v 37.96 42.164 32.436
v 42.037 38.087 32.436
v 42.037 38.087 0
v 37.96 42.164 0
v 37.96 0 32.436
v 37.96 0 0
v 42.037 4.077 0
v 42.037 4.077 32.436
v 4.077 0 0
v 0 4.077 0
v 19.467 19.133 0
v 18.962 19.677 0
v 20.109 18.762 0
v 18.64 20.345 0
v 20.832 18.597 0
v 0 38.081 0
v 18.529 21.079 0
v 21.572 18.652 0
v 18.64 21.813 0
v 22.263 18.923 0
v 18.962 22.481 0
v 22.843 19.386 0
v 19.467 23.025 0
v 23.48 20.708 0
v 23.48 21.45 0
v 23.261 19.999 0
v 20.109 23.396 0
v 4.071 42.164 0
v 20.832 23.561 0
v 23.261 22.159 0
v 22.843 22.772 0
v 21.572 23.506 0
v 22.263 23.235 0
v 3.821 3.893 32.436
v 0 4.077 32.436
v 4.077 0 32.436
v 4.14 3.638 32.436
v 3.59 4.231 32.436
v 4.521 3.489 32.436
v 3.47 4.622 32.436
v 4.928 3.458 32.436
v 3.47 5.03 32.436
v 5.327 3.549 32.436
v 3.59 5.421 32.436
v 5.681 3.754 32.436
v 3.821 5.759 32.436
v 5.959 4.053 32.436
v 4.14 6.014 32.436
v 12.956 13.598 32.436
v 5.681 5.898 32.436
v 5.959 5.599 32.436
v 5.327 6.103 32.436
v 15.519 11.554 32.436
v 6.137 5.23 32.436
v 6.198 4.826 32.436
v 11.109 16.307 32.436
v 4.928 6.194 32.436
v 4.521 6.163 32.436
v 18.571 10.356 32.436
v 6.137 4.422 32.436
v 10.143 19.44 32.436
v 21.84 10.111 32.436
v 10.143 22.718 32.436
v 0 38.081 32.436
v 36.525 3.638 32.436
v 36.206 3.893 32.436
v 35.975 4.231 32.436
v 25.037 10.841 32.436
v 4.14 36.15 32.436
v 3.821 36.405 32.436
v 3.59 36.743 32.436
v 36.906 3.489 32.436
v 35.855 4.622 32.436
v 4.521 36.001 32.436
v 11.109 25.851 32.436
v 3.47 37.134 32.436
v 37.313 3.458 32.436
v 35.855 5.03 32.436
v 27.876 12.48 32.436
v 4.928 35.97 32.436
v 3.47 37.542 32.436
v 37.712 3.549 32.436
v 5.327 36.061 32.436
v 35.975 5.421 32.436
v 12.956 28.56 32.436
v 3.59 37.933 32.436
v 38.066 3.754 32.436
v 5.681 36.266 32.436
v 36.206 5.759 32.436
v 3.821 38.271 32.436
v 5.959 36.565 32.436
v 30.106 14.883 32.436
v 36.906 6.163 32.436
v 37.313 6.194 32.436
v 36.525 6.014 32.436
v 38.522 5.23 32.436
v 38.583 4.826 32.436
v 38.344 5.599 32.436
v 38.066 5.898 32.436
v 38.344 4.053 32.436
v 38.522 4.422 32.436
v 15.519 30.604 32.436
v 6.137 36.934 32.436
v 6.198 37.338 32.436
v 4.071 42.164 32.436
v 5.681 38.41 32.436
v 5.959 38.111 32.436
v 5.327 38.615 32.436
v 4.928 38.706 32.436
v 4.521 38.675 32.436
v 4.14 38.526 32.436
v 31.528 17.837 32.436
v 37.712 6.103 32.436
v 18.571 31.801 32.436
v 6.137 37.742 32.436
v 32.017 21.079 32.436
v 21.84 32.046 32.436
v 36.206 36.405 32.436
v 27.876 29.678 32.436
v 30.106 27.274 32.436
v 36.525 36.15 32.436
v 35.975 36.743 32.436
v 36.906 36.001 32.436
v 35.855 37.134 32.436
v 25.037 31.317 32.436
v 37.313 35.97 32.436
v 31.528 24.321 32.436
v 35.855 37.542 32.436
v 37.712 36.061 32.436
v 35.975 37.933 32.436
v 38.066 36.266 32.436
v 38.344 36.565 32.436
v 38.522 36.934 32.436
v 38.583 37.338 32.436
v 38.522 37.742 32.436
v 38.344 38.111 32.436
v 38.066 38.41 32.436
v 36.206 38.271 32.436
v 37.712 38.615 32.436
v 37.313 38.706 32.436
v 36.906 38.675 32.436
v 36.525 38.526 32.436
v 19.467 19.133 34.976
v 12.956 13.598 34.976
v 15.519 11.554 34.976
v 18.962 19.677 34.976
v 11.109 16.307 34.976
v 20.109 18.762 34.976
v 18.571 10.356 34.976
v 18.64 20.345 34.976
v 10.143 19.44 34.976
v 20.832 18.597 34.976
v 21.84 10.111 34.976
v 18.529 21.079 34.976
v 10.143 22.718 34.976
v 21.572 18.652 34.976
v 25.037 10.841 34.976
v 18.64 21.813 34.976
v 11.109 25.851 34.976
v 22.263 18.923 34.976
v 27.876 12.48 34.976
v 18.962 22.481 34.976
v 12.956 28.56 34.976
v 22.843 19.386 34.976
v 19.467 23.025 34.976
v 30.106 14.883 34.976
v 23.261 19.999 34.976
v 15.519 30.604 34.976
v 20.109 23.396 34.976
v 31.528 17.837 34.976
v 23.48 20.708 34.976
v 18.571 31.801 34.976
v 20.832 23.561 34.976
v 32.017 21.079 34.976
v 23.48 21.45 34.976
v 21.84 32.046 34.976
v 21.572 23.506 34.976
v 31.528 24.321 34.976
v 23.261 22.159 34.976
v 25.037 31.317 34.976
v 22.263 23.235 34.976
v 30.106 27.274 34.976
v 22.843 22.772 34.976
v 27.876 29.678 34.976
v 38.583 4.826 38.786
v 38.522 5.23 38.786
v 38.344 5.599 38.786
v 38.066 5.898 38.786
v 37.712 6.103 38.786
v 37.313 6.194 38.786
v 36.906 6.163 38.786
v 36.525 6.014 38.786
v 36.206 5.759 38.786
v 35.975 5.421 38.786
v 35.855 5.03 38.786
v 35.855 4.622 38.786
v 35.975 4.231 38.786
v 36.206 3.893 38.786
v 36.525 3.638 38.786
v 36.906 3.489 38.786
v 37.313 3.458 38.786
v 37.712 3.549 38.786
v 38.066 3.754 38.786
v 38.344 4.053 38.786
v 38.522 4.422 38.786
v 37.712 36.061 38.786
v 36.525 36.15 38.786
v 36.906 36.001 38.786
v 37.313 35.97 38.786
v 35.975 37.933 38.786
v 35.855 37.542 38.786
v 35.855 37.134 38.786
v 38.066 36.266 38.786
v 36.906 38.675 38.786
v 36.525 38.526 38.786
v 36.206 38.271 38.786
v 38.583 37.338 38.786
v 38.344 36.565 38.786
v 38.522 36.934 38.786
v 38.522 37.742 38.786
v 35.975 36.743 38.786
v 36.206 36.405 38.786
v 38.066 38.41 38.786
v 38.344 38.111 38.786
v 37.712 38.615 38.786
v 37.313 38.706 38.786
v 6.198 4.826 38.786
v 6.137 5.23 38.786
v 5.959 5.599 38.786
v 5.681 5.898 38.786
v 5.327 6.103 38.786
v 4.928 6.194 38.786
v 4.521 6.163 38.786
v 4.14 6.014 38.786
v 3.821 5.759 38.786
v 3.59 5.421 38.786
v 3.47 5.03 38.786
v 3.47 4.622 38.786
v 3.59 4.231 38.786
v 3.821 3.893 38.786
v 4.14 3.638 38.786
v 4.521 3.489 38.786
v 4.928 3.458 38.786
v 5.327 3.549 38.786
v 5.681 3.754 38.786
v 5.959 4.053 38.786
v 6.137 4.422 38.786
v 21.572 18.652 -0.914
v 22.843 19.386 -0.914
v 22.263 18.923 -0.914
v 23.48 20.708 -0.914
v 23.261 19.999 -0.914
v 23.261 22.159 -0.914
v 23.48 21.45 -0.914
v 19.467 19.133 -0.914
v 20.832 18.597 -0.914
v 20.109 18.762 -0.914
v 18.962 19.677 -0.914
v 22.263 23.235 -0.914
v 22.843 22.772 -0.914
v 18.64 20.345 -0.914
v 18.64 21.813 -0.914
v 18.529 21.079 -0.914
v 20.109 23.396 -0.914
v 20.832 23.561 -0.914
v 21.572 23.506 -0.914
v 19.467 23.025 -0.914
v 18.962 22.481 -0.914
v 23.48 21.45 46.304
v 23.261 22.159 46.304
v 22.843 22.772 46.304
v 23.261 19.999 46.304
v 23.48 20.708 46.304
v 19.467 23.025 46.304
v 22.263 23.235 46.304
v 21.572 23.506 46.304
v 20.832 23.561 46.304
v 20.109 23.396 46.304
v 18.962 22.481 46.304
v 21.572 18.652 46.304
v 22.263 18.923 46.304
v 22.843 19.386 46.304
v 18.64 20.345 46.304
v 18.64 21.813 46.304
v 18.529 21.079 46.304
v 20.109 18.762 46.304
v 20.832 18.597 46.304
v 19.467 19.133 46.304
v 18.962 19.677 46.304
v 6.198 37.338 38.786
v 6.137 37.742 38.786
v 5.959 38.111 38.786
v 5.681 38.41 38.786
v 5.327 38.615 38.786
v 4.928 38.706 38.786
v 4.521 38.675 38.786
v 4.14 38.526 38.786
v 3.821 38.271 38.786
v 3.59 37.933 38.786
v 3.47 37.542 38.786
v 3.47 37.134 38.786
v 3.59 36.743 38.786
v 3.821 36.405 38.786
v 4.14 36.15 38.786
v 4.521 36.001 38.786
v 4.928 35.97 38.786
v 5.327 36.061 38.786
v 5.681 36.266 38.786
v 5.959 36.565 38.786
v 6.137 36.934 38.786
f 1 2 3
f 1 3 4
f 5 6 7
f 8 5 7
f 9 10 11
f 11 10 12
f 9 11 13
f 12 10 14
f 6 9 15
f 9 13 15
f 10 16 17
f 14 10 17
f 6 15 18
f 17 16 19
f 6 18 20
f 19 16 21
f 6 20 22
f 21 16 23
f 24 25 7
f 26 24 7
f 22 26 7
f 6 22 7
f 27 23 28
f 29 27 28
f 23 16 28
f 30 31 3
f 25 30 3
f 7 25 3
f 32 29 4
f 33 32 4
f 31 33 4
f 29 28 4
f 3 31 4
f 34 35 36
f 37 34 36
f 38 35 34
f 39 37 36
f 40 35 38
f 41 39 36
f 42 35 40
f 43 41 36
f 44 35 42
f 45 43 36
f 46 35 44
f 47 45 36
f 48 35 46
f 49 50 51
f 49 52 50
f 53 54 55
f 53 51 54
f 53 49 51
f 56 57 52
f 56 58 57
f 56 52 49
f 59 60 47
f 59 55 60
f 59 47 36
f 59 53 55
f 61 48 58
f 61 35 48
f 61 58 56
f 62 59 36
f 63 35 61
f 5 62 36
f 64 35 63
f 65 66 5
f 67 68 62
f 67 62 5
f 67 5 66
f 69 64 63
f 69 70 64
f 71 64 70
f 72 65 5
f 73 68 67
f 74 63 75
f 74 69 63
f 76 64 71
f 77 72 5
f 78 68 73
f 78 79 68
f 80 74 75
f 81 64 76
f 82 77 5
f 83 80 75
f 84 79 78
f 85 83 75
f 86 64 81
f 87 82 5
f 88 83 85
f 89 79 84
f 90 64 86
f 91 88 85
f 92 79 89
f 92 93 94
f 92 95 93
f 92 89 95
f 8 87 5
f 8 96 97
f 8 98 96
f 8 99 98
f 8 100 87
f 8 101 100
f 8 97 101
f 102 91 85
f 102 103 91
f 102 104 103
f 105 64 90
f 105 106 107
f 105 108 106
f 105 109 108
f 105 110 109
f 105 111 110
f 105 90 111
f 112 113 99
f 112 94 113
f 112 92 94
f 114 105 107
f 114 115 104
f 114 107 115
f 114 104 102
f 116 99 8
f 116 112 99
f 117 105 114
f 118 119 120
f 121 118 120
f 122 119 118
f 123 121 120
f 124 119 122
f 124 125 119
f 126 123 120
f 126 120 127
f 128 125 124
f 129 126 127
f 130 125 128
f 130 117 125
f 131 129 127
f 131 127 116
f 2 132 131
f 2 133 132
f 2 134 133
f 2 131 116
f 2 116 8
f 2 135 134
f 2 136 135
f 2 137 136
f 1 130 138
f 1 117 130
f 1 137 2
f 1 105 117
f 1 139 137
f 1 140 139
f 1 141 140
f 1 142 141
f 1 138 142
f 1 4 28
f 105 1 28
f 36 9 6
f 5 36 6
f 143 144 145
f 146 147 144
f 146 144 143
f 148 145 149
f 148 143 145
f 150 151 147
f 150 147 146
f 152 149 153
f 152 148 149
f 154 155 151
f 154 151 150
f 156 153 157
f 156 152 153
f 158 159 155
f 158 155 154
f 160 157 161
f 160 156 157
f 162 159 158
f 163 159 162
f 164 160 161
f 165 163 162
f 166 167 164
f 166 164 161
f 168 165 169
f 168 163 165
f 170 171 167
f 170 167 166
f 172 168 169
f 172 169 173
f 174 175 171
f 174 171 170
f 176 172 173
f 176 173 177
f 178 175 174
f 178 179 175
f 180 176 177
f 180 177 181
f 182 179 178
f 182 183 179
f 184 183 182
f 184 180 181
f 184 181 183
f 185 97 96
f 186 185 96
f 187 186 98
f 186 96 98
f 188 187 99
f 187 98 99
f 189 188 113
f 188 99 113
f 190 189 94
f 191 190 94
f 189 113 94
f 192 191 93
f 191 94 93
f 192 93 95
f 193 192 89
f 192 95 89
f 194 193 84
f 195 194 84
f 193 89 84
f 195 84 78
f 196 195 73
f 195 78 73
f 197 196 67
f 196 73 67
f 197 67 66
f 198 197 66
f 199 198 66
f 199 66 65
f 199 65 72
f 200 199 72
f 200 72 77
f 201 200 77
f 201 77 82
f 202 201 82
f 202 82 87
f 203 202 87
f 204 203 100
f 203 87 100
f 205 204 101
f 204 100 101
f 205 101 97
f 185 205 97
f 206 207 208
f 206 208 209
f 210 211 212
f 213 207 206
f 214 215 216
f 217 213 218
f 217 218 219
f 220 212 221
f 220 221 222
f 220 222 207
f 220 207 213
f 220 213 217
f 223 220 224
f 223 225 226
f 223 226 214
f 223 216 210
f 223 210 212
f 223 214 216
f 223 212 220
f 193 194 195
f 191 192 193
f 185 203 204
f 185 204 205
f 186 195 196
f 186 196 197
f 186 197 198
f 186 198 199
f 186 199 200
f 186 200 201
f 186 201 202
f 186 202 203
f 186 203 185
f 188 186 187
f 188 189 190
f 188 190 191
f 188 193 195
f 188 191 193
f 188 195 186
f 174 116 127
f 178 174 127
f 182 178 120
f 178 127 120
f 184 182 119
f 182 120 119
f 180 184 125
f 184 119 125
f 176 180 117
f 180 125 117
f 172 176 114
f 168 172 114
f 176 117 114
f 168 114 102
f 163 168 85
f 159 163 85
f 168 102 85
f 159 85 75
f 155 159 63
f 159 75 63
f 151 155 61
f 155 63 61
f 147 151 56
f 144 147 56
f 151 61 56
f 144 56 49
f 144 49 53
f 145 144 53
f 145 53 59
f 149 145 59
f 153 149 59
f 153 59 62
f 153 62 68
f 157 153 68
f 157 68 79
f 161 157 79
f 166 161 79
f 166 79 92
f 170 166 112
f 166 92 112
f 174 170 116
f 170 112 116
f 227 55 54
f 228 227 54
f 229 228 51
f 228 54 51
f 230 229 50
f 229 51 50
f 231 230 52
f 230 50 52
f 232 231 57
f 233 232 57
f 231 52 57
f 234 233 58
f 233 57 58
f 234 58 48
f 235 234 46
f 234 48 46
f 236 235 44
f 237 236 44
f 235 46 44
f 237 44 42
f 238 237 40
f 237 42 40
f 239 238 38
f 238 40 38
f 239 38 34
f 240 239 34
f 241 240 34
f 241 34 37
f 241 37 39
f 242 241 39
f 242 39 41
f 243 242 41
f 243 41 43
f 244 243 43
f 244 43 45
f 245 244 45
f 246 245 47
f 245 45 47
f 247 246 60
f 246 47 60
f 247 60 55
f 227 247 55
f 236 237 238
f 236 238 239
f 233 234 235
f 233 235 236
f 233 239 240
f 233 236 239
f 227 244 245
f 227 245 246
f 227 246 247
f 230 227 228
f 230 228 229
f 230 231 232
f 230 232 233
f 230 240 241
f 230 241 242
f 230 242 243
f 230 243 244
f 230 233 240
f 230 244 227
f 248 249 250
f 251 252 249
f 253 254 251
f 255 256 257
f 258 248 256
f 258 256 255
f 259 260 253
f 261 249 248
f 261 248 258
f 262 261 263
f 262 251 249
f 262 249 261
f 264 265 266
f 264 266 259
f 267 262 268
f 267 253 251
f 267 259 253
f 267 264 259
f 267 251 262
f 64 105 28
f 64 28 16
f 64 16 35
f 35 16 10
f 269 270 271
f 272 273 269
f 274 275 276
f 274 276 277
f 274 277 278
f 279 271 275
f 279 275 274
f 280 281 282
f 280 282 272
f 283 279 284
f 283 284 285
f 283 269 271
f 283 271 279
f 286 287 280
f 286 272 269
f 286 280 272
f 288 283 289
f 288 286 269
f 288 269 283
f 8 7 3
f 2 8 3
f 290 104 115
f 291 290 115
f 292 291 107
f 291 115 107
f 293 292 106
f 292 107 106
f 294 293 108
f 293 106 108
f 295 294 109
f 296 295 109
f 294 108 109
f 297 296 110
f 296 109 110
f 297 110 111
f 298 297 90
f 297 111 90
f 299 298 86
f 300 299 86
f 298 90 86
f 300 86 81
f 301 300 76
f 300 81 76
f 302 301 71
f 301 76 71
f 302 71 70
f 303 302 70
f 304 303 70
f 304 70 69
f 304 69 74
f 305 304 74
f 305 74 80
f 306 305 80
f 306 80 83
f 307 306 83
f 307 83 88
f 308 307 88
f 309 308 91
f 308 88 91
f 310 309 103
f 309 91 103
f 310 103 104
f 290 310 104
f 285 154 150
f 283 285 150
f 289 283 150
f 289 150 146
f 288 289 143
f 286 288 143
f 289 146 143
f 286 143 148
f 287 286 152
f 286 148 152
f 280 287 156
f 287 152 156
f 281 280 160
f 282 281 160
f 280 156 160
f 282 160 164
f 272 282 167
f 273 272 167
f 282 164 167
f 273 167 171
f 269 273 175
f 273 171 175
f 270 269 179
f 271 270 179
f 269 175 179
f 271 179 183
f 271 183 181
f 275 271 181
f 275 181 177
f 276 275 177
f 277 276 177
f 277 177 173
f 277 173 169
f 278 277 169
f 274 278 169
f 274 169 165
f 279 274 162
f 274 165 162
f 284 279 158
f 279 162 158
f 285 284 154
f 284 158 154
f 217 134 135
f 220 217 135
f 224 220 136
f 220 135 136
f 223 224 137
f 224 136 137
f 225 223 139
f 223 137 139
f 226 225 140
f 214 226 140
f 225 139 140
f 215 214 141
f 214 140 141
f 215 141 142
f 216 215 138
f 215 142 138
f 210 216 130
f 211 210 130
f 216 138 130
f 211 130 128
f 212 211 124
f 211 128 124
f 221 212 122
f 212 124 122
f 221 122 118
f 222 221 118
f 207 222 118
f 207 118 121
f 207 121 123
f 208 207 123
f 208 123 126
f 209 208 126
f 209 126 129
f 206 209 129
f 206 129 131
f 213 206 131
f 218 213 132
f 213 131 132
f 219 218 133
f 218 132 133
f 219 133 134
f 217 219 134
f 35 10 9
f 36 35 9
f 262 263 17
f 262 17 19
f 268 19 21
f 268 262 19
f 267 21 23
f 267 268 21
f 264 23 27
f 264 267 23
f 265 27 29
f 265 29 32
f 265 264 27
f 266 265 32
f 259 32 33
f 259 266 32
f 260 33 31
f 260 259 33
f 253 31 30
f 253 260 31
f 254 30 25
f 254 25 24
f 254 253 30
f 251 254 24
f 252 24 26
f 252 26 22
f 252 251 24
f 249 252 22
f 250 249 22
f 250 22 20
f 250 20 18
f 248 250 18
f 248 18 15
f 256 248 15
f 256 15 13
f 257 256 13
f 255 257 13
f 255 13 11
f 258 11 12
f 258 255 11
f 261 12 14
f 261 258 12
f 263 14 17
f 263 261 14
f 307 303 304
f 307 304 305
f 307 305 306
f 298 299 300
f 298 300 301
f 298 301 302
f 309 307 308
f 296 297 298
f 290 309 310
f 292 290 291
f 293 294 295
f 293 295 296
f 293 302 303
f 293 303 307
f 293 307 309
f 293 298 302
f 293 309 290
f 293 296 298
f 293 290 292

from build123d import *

# Parameters (mm, degrees)
BOSS_EXTRUDE4_DEPTH = 32.4358
SKETCH4_R           = 10.9982
BOSS_EXTRUDE5_DEPTH = 2.54
SKETCH5_R           = 2.4892
BOSS_EXTRUDE6_DEPTH = 11.3284
SKETCH6_R           = 1.3716
BOSS_EXTRUDE7_DEPTH = 6.35
BOSS_EXTRUDE8_START = 0.9144
SKETCH7_R           = 2.4892
BOSS_EXTRUDE8_DEPTH = 0.9144


with BuildPart() as part:
    # Sketch1 → Boss-Extrude4 (new body)
    with BuildSketch(Plane.XY):
        Polygon((0, 4.077036279), (4.077036279, 0), (37.959963721, 0), (42.037, 4.077036279), (42.037, 38.086963721), (37.959963721, 42.164), (4.070882272, 42.164), (0, 38.08081899), align=None)
    extrude(amount=BOSS_EXTRUDE4_DEPTH)

    # Sketch4 → Boss-Extrude5 (add)
    with BuildSketch(Plane.XY.offset(32.4358)):
        with Locations((21.0185, 21.078927634)):
            Circle(SKETCH4_R)
    extrude(amount=BOSS_EXTRUDE5_DEPTH)

    # Sketch5 → Boss-Extrude6 (add)
    with BuildSketch(Plane.XY.offset(34.9758)):
        with Locations(Location((21.0185, 21.078927634, 0), (0, 0, 180))):
            Circle(SKETCH5_R)
    extrude(amount=BOSS_EXTRUDE6_DEPTH)

    # Sketch6 → Boss-Extrude7 (add)
    with BuildSketch(Plane.XY.offset(32.4358)):
        with Locations((4.826, 37.338)):
            Circle(SKETCH6_R)
        with Locations((4.826, 4.826)):
            Circle(SKETCH6_R)
        with Locations((37.211, 4.826)):
            Circle(SKETCH6_R)
        with Locations((37.211, 37.338)):
            Circle(SKETCH6_R)
    extrude(amount=BOSS_EXTRUDE7_DEPTH)

    # Sketch7 → Boss-Extrude8 (add)
    with BuildSketch(Plane(origin=(0, 0, 0), x_dir=(-1, 0, 0), z_dir=(0, 0, -1)).offset(BOSS_EXTRUDE8_START)):
        with Locations((-21.0185, 21.078927634)):
            Circle(SKETCH7_R)
    extrude(amount=-BOSS_EXTRUDE8_DEPTH)


solid = part.part
